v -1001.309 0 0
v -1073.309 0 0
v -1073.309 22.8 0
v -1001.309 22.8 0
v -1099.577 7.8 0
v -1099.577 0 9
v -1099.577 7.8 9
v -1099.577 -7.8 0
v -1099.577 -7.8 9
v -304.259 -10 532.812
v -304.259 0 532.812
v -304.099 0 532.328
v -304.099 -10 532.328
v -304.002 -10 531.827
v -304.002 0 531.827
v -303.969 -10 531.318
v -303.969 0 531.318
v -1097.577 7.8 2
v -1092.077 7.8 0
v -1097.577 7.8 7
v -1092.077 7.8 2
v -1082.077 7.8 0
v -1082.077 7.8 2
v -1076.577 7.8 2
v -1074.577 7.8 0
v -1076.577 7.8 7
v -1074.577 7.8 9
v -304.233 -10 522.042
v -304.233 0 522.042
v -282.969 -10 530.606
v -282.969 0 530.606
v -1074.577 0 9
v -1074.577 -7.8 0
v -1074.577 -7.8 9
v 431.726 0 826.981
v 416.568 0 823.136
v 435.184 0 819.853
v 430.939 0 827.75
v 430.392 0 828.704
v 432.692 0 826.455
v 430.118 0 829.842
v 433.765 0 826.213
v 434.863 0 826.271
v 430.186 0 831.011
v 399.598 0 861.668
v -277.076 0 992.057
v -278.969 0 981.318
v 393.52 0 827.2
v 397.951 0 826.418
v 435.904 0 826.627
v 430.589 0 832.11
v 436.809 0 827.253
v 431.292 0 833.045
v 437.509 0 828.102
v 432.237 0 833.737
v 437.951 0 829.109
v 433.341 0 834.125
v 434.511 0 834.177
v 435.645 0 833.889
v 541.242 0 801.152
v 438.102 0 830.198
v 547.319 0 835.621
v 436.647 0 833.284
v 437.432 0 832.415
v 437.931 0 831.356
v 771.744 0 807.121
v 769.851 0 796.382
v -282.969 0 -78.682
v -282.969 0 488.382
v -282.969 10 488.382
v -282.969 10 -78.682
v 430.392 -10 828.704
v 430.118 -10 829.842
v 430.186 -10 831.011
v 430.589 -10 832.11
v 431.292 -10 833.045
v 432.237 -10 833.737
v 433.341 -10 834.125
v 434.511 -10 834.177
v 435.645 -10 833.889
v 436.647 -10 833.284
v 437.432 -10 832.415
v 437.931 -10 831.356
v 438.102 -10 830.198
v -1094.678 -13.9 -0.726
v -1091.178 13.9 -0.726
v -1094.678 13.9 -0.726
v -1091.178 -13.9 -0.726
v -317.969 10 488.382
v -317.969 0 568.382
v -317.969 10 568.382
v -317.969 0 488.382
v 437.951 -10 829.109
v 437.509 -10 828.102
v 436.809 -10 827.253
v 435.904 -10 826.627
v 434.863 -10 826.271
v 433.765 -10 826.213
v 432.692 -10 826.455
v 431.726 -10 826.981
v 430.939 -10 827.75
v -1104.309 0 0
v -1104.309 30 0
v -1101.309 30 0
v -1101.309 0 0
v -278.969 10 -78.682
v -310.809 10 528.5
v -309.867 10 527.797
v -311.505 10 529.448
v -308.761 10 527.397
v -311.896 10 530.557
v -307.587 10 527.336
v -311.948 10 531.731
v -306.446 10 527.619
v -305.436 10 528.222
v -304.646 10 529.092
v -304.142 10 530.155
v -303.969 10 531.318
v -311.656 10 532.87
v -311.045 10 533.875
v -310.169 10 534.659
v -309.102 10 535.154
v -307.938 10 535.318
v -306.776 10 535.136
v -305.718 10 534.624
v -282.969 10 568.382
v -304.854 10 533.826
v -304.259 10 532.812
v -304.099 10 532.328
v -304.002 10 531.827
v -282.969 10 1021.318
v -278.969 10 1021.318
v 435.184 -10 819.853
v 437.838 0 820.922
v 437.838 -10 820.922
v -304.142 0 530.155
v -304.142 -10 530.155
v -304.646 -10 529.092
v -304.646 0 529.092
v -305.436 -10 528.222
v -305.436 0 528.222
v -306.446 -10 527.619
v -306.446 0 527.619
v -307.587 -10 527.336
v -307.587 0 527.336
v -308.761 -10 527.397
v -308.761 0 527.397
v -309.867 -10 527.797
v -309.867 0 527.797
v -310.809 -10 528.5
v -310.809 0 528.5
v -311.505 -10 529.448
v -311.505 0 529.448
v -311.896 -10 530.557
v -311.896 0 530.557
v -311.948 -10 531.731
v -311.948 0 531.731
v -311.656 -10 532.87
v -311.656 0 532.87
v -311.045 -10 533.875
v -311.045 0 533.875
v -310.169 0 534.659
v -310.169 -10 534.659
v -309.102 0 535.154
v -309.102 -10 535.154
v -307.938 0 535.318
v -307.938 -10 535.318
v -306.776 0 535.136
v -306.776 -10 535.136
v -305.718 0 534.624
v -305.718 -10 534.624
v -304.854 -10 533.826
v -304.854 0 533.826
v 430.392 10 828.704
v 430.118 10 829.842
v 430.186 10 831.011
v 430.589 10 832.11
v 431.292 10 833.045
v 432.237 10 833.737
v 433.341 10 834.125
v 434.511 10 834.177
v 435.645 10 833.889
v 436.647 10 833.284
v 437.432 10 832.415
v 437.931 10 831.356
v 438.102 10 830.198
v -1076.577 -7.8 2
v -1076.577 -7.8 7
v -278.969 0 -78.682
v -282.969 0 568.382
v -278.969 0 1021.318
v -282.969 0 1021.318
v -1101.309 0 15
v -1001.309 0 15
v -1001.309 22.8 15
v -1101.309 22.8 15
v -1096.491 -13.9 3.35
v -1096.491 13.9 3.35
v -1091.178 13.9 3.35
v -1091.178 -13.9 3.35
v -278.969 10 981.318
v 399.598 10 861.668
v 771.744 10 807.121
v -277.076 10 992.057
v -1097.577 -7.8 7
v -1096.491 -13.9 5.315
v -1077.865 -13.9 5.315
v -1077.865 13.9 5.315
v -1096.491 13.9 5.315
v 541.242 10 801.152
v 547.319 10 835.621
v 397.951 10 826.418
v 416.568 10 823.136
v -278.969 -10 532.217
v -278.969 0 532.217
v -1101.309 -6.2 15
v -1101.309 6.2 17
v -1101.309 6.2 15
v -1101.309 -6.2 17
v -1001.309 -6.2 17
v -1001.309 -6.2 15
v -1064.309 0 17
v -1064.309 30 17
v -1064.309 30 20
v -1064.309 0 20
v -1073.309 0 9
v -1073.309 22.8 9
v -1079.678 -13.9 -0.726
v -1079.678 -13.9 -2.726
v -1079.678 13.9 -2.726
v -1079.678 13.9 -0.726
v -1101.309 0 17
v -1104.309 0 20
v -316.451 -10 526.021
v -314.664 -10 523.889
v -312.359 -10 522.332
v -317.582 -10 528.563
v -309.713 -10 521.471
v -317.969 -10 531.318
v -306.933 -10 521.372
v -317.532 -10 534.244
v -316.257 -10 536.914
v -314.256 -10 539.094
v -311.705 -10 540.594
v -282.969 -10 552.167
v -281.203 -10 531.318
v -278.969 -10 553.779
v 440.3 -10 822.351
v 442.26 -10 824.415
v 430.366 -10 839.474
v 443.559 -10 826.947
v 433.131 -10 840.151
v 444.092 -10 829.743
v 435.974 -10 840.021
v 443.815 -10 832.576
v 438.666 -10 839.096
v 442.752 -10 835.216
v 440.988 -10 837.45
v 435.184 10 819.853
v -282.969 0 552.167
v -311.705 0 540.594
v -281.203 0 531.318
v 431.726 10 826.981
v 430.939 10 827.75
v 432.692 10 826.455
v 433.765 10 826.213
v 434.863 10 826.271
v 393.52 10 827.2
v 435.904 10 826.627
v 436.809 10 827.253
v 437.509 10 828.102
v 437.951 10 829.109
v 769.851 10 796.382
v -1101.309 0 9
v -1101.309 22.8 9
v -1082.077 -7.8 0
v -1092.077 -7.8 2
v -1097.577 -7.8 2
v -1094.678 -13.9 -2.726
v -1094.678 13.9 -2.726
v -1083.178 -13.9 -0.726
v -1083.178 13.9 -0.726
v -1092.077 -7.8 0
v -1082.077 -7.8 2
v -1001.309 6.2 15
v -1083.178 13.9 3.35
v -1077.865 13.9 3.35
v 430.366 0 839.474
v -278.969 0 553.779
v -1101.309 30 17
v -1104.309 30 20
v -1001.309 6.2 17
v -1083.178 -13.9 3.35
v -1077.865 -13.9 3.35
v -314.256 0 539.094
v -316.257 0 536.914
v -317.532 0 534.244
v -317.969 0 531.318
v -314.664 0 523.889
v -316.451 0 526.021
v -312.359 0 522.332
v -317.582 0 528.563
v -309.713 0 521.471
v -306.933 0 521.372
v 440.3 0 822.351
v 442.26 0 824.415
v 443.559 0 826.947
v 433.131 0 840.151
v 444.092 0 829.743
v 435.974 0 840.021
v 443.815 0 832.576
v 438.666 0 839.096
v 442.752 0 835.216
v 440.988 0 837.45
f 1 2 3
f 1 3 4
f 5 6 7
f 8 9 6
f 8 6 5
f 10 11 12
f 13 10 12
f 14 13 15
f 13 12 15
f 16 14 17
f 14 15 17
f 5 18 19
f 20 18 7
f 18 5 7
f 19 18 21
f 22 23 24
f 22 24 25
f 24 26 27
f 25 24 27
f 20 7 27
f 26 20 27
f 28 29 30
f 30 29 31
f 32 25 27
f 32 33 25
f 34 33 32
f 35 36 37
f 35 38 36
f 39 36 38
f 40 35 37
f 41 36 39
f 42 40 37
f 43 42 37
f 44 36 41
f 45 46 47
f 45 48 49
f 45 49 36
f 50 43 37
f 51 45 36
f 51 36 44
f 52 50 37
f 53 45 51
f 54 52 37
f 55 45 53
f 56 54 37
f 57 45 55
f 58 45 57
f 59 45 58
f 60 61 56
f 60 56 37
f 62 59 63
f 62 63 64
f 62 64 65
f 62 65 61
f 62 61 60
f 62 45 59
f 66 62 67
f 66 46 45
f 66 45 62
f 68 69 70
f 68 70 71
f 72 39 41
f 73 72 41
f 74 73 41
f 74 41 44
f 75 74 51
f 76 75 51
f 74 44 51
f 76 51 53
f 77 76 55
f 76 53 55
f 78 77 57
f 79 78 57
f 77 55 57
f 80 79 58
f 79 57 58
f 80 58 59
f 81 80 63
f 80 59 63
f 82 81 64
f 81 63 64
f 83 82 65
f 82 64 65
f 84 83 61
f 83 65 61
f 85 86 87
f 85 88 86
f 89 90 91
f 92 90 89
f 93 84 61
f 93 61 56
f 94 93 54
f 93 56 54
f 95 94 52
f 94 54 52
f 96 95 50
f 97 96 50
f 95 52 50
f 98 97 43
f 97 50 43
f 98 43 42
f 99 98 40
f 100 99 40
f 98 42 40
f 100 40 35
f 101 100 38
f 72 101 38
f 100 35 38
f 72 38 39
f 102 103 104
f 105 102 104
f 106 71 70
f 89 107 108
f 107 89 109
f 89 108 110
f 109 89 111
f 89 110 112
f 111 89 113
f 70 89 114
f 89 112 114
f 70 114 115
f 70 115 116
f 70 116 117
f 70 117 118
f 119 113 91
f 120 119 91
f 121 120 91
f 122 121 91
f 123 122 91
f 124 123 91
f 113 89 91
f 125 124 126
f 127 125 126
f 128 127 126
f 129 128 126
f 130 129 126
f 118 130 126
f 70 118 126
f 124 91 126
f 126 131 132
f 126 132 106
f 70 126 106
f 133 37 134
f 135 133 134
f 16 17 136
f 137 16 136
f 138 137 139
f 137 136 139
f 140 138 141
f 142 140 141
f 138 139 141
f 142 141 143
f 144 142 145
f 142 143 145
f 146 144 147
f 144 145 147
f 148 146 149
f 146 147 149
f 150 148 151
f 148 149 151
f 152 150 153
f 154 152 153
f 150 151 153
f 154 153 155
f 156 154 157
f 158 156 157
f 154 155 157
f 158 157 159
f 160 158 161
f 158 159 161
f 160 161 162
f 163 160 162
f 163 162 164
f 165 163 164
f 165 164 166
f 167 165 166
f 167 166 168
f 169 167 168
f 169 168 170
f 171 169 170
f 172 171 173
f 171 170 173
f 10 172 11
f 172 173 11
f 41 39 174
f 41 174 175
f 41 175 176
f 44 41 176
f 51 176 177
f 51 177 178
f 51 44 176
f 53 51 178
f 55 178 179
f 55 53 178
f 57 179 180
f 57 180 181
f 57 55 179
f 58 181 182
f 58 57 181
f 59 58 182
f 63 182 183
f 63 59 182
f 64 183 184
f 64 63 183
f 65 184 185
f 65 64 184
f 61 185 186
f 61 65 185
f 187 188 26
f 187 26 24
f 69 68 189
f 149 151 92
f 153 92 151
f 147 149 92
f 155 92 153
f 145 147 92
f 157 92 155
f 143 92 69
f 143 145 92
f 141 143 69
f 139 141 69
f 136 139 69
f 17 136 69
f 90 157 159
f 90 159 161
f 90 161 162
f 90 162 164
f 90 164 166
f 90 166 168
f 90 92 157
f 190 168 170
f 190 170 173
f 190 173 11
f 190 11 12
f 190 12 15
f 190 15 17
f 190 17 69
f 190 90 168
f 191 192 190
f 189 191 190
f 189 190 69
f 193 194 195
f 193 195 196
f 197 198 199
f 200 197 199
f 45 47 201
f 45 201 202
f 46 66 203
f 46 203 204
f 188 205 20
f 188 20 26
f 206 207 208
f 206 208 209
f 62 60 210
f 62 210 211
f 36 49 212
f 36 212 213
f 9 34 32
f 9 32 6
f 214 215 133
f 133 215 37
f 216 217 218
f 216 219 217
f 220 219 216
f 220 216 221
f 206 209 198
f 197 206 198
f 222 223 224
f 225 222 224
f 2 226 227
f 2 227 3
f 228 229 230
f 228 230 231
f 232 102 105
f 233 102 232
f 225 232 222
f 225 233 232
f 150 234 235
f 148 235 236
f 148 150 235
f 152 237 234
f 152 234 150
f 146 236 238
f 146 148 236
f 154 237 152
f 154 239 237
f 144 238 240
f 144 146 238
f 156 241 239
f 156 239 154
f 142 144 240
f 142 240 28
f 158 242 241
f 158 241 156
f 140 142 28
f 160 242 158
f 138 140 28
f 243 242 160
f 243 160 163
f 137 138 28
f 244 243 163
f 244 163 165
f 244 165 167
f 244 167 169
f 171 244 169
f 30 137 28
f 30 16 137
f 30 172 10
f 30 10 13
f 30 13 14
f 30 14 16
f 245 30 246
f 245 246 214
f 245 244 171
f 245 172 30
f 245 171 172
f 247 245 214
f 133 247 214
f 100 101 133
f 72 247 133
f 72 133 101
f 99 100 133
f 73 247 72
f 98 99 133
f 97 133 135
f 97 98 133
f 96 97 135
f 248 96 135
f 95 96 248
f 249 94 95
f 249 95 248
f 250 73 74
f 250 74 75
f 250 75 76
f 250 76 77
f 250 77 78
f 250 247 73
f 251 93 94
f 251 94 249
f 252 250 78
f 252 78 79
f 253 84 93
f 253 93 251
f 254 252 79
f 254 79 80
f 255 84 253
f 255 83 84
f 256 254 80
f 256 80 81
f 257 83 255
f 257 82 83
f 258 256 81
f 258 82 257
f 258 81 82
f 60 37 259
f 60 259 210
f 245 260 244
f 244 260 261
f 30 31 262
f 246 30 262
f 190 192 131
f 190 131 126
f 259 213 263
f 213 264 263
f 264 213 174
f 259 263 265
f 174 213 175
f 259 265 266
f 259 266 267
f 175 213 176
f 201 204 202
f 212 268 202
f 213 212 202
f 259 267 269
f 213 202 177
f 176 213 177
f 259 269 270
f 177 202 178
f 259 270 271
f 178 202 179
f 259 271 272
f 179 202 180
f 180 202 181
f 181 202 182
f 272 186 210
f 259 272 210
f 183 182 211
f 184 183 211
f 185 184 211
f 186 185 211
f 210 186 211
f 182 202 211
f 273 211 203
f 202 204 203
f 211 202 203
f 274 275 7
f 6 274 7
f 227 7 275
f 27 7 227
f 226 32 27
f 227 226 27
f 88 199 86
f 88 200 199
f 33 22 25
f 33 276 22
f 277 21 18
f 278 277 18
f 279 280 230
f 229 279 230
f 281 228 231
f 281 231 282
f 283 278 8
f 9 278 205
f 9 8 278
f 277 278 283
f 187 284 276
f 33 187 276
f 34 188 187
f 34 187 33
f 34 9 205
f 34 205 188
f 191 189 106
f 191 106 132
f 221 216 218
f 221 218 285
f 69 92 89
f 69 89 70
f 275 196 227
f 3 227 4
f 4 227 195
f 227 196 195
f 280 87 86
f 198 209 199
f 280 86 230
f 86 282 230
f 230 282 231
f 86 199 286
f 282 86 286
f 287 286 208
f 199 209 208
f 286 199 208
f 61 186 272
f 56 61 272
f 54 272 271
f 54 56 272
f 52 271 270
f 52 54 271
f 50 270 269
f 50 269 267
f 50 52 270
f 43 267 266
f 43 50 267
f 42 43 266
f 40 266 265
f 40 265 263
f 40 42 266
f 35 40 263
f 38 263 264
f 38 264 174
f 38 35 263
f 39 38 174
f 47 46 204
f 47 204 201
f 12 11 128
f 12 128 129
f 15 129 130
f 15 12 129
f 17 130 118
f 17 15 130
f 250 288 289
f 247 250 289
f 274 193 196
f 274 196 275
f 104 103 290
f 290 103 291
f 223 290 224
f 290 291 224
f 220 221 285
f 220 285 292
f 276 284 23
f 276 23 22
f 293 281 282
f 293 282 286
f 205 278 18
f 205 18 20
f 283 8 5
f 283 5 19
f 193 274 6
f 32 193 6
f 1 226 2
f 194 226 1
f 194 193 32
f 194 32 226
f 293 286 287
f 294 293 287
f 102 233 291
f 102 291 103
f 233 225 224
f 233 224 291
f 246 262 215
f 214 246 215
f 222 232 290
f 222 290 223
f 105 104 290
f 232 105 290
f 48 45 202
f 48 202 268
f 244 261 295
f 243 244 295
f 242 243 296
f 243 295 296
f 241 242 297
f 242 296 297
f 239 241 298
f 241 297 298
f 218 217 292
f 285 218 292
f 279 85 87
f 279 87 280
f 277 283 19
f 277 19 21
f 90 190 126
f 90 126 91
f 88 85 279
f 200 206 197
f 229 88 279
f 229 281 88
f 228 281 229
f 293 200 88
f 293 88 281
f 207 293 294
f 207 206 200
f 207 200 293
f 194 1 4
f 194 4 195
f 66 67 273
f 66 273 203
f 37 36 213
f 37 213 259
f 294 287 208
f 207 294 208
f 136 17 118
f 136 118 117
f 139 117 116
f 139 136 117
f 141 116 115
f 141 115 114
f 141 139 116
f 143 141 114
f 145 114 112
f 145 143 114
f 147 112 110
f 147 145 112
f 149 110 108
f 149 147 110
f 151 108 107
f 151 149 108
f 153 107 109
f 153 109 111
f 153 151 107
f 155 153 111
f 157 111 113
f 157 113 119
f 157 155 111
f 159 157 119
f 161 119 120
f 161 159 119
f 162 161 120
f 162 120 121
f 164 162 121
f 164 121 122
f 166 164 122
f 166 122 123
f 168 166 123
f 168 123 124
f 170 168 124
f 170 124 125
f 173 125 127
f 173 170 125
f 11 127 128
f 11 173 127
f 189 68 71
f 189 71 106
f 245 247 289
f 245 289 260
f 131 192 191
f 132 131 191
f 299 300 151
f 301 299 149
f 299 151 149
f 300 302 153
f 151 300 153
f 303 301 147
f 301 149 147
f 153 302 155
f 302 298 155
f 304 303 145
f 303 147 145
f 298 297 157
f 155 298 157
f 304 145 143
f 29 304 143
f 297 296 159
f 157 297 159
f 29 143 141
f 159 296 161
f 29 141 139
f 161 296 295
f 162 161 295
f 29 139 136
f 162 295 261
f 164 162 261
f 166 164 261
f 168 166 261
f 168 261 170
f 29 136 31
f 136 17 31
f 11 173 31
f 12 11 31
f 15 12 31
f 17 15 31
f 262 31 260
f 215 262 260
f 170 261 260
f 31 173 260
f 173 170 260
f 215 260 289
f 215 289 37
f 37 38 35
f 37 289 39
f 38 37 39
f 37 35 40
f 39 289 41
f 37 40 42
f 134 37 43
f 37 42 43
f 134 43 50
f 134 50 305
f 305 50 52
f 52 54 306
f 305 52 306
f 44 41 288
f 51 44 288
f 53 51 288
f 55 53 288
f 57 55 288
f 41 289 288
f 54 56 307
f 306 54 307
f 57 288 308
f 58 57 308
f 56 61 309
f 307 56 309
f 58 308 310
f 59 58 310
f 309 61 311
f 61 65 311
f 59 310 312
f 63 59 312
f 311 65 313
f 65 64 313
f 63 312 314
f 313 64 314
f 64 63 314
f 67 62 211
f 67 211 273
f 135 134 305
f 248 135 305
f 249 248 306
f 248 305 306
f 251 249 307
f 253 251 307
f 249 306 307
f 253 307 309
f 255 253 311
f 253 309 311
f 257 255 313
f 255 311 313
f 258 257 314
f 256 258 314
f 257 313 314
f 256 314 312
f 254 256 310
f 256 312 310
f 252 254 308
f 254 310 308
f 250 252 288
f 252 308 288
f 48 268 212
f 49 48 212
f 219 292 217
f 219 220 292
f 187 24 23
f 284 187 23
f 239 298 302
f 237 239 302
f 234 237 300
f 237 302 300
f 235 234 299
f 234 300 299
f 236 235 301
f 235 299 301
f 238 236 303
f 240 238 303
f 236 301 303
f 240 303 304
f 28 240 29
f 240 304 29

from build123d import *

# Parameters (mm, degrees)
F0_W     = 4
F0_H     = 40
F1_DEPTH = 10
F2_DEPTH = 10
F3_DEPTH = 30
F4_DEPTH = 22.8
F5_DEPTH = 6.2
F6_DEPTH = 7.8
F7_DEPTH = 13.9


with BuildPart() as f1:
    # F0 (on Front) → F1 (new body)
    with BuildSketch(Plane.XZ):
        with Locations((-280.9693748896, 1001.3177108765)):
            Rectangle(F0_W, F0_H)
        Polygon((-278.9693748896, 553.778526953), (-278.9693748896, 981.3177108765), (-282.9693748896, 981.3177108765), (-282.9693748896, 568.3815050125), (-282.9693748896, 552.1674667156), align=None)
        with BuildLine():
            Line((-282.9693748896, 552.1674667156), (-282.9693748896, 568.3815050125))
            Line((-282.9693748896, 568.3815050125), (-317.9693748896, 568.3815050125))
            Line((-317.9693748896, 568.3815050125), (-317.9693748896, 531.3177108765))
            ThreePointArc((-317.9693748896, 531.3177108765), (-316.2567167208, 536.9141352146), (-311.7053818151, 540.593607181))
            Line((-311.7053818151, 540.593607181), (-282.9693748896, 552.1674667156))
        make_face()
        with BuildLine():
            ThreePointArc((-304.233367964, 522.0418145719), (-313.5657992277, 523.0303690452), (-317.9693748896, 531.3177108765))
            Line((-317.9693748896, 531.3177108765), (-317.9693748896, 488.3815050125))
            Line((-317.9693748896, 488.3815050125), (-282.9693748896, 488.3815050125))
            Line((-282.9693748896, 488.3815050125), (-282.9693748896, 530.6062080044))
            Line((-282.9693748896, 530.6062080044), (-304.233367964, 522.0418145719))
        make_face()
        with BuildLine():
            Line((-282.9693748896, 541.38683736), (-282.9693748896, 552.1674667156))
            Line((-282.9693748896, 552.1674667156), (-311.7053818151, 540.593607181))
            ThreePointArc((-311.7053818151, 540.593607181), (-316.2567167208, 536.9141352146), (-317.9693748896, 531.3177108765))
            ThreePointArc((-317.9693748896, 531.3177108765), (-313.5657992277, 523.0303690452), (-304.233367964, 522.0418145719))
            Line((-304.233367964, 522.0418145719), (-282.9693748896, 530.6062080044))
            Line((-282.9693748896, 530.6062080044), (-282.9693748896, 531.3177108765))
            Line((-282.9693748896, 531.3177108765), (-303.9693748896, 531.3177108765))
            ThreePointArc((-303.9693748896, 531.3177108765), (-311.8962969723, 530.5566044737), (-304.2590163678, 532.8121136467))
            Line((-304.2590163678, 532.8121136467), (-282.9693748896, 541.38683736))
        make_face()
        with BuildLine():
            Line((-282.9693748896, 531.3177108765), (-282.9693748896, 541.38683736))
            Line((-282.9693748896, 541.38683736), (-304.2590163678, 532.8121136467))
            ThreePointArc((-304.2590163678, 532.8121136467), (-304.0424528069, 532.0788172793), (-303.9693748896, 531.3177108765))
            Line((-303.9693748896, 531.3177108765), (-282.9693748896, 531.3177108765))
        make_face()
        Polygon((-282.9693748896, 530.6062080044), (-281.2028292186, 531.3177108765), (-282.9693748896, 531.3177108765), align=None)
        Polygon((-278.9693748896, 531.3177108765), (-278.9693748896, 532.2172682418), (-281.2028292186, 531.3177108765), align=None)
        Polygon((-278.9693748896, 532.2172682418), (-278.9693748896, 542.9978975974), (-282.9693748896, 541.38683736), (-282.9693748896, 531.3177108765), (-281.2028292186, 531.3177108765), align=None)
        Polygon((-278.9693748896, 542.9978975974), (-278.9693748896, 553.778526953), (-282.9693748896, 552.1674667156), (-282.9693748896, 541.38683736), align=None)
        Polygon((-278.9693748896, -78.6822891235), (-278.9693748896, 531.3177108765), (-281.2028292186, 531.3177108765), (-282.9693748896, 530.6062080044), (-282.9693748896, 488.3815050125), (-282.9693748896, -78.6822891235), align=None)
    extrude(amount=-F1_DEPTH)


with BuildPart() as f1b:
    # F0 (on Front) → F1, piece 2 (new body)
    with BuildSketch(Plane.XZ):
        Polygon((-277.075792163, 992.0567521677), (-278.9693748896, 981.3177108765), (399.5981600666, 861.6679462309), (547.3193230184, 835.6207195808), (769.8508820684, 796.3824016612), (771.744464795, 807.1214429524), align=None)
        with BuildLine():
            Line((547.3193230184, 835.6207195808), (399.5981600666, 861.6679462309))
            Line((399.5981600666, 861.6679462309), (393.5204738483, 827.1996748754))
            Line((393.5204738483, 827.1996748754), (397.9510892088, 826.4184378462))
            Line((397.9510892088, 826.4184378462), (430.3663225466, 839.4741612251))
            ThreePointArc((430.3663225466, 839.4741612251), (443.3782257766, 833.9342718461), (437.8383363977, 820.9223686161))
            Line((437.8383363977, 820.9223686161), (435.1839593227, 819.8532782759))
            Line((435.1839593227, 819.8532782759), (541.2416368001, 801.1524482254))
            Line((541.2416368001, 801.1524482254), (547.3193230184, 835.6207195808))
        make_face()
        with BuildLine():
            Line((430.3663225466, 839.4741612251), (397.9510892088, 826.4184378462))
            Line((397.9510892088, 826.4184378462), (416.5675242658, 823.1358580611))
            Line((416.5675242658, 823.1358580611), (435.1839593227, 819.8532782759))
            Line((435.1839593227, 819.8532782759), (437.8383363977, 820.9223686161))
            ThreePointArc((437.8383363977, 820.9223686161), (443.3782257766, 833.9342718461), (430.3663225466, 839.4741612251))
        make_face()
        with BuildLine():
            ThreePointArc((438.1023294721, 830.1982649206), (434.8634358749, 826.2713428379), (430.3919709503, 828.7038621504))
            ThreePointArc((430.3919709503, 828.7038621504), (433.3412230693, 834.1251870033), (438.1023294721, 830.1982649206))
        make_face(mode=Mode.SUBTRACT)
    extrude(amount=-F1_DEPTH)


with BuildPart() as f2:
    # F0 (on Front) → F2 (new body)
    with BuildSketch(Plane.XZ):
        with BuildLine():
            Line((-282.9693748896, 541.38683736), (-282.9693748896, 552.1674667156))
            Line((-282.9693748896, 552.1674667156), (-311.7053818151, 540.593607181))
            ThreePointArc((-311.7053818151, 540.593607181), (-316.2567167208, 536.9141352146), (-317.9693748896, 531.3177108765))
            ThreePointArc((-317.9693748896, 531.3177108765), (-313.5657992277, 523.0303690452), (-304.233367964, 522.0418145719))
            Line((-304.233367964, 522.0418145719), (-282.9693748896, 530.6062080044))
            Line((-282.9693748896, 530.6062080044), (-282.9693748896, 531.3177108765))
            Line((-282.9693748896, 531.3177108765), (-303.9693748896, 531.3177108765))
            ThreePointArc((-303.9693748896, 531.3177108765), (-311.8962969723, 530.5566044737), (-304.2590163678, 532.8121136467))
            Line((-304.2590163678, 532.8121136467), (-282.9693748896, 541.38683736))
        make_face()
        Polygon((-278.9693748896, 542.9978975974), (-278.9693748896, 553.778526953), (-282.9693748896, 552.1674667156), (-282.9693748896, 541.38683736), align=None)
        with BuildLine():
            Line((-282.9693748896, 531.3177108765), (-282.9693748896, 541.38683736))
            Line((-282.9693748896, 541.38683736), (-304.2590163678, 532.8121136467))
            ThreePointArc((-304.2590163678, 532.8121136467), (-304.0424528069, 532.0788172793), (-303.9693748896, 531.3177108765))
            Line((-303.9693748896, 531.3177108765), (-282.9693748896, 531.3177108765))
        make_face()
        Polygon((-278.9693748896, 532.2172682418), (-278.9693748896, 542.9978975974), (-282.9693748896, 541.38683736), (-282.9693748896, 531.3177108765), (-281.2028292186, 531.3177108765), align=None)
        Polygon((-282.9693748896, 530.6062080044), (-281.2028292186, 531.3177108765), (-282.9693748896, 531.3177108765), align=None)
        Polygon((397.9510892088, 826.4184378462), (-278.9693748896, 553.778526953), (-278.9693748896, 542.9978975974), (416.5675242658, 823.1358580611), align=None)
        Polygon((416.5675242658, 823.1358580611), (-278.9693748896, 542.9978975974), (-278.9693748896, 532.2172682418), (435.1839593227, 819.8532782759), align=None)
        with BuildLine():
            Line((430.3663225466, 839.4741612251), (397.9510892088, 826.4184378462))
            Line((397.9510892088, 826.4184378462), (416.5675242658, 823.1358580611))
            Line((416.5675242658, 823.1358580611), (435.1839593227, 819.8532782759))
            Line((435.1839593227, 819.8532782759), (437.8383363977, 820.9223686161))
            ThreePointArc((437.8383363977, 820.9223686161), (443.3782257766, 833.9342718461), (430.3663225466, 839.4741612251))
        make_face()
        with BuildLine():
            ThreePointArc((438.1023294721, 830.1982649206), (434.8634358749, 826.2713428379), (430.3919709503, 828.7038621504))
            ThreePointArc((430.3919709503, 828.7038621504), (433.3412230693, 834.1251870033), (438.1023294721, 830.1982649206))
        make_face(mode=Mode.SUBTRACT)
    extrude(amount=F2_DEPTH)


with BuildPart() as f3:
    # F0 (on Front) → F3 (new body)
    with BuildSketch(Plane.XZ):
        Polygon((-1104.308552742, 20), (-1104.308552742, 0), (-1101.308552742, 0), (-1101.308552742, 9), (-1101.308552742, 15), (-1101.308552742, 17), (-1064.308552742, 17), (-1064.308552742, 20), align=None)
    extrude(amount=-F3_DEPTH)


with BuildPart() as f4:
    # F0 (on Front) → F4 (new body)
    with BuildSketch(Plane.XZ):
        Polygon((-1101.308552742, 15), (-1101.308552742, 9), (-1099.5766592026, 9), (-1074.5766592026, 9), (-1073.308552742, 9), (-1073.308552742, 0), (-1001.308552742, 0), (-1001.308552742, 15), align=None)
    extrude(amount=-F4_DEPTH)

    # F0 (on Front) → F6 (join, symmetric)
    with BuildSketch(Plane.XZ):
        Polygon((-1074.5766592026, 9), (-1099.5766592026, 9), (-1099.5766592026, 0), (-1092.0766592026, 0), (-1092.0766592026, 2), (-1097.5766592026, 2), (-1097.5766592026, 7), (-1076.5766592026, 7), (-1076.5766592026, 2), (-1082.0766592026, 2), (-1082.0766592026, 0), (-1074.5766592026, 0), align=None)
    extrude(amount=F6_DEPTH, both=True)


with BuildPart() as f5:
    # F0 (on Front) → F5 (new body, symmetric)
    with BuildSketch(Plane.XZ):
        Polygon((-1101.308552742, 17), (-1101.308552742, 15), (-1001.308552742, 15), (-1001.308552742, 17), (-1064.308552742, 17), align=None)
    extrude(amount=F5_DEPTH, both=True)


with BuildPart() as f7:
    # F0 (on Front) → F7 (new body, symmetric)
    with BuildSketch(Plane.XZ):
        Polygon((-1091.1783339338, -0.725868158), (-1094.6783339338, -0.725868158), (-1094.6783339338, -2.725868158), (-1079.6783339338, -2.725868158), (-1079.6783339338, -0.725868158), (-1083.1783339338, -0.725868158), (-1083.1783339338, 3.3500614809), (-1077.8651758985, 3.3500614809), (-1077.8651758985, 5.3152422188), (-1096.4914919691, 5.3152422188), (-1096.4914919691, 3.3500614809), (-1091.1783339338, 3.3500614809), align=None)
    extrude(amount=F7_DEPTH, both=True)


solid = Compound([f1.part, f1b.part, f2.part, f3.part, f4.part, f5.part, f7.part])
